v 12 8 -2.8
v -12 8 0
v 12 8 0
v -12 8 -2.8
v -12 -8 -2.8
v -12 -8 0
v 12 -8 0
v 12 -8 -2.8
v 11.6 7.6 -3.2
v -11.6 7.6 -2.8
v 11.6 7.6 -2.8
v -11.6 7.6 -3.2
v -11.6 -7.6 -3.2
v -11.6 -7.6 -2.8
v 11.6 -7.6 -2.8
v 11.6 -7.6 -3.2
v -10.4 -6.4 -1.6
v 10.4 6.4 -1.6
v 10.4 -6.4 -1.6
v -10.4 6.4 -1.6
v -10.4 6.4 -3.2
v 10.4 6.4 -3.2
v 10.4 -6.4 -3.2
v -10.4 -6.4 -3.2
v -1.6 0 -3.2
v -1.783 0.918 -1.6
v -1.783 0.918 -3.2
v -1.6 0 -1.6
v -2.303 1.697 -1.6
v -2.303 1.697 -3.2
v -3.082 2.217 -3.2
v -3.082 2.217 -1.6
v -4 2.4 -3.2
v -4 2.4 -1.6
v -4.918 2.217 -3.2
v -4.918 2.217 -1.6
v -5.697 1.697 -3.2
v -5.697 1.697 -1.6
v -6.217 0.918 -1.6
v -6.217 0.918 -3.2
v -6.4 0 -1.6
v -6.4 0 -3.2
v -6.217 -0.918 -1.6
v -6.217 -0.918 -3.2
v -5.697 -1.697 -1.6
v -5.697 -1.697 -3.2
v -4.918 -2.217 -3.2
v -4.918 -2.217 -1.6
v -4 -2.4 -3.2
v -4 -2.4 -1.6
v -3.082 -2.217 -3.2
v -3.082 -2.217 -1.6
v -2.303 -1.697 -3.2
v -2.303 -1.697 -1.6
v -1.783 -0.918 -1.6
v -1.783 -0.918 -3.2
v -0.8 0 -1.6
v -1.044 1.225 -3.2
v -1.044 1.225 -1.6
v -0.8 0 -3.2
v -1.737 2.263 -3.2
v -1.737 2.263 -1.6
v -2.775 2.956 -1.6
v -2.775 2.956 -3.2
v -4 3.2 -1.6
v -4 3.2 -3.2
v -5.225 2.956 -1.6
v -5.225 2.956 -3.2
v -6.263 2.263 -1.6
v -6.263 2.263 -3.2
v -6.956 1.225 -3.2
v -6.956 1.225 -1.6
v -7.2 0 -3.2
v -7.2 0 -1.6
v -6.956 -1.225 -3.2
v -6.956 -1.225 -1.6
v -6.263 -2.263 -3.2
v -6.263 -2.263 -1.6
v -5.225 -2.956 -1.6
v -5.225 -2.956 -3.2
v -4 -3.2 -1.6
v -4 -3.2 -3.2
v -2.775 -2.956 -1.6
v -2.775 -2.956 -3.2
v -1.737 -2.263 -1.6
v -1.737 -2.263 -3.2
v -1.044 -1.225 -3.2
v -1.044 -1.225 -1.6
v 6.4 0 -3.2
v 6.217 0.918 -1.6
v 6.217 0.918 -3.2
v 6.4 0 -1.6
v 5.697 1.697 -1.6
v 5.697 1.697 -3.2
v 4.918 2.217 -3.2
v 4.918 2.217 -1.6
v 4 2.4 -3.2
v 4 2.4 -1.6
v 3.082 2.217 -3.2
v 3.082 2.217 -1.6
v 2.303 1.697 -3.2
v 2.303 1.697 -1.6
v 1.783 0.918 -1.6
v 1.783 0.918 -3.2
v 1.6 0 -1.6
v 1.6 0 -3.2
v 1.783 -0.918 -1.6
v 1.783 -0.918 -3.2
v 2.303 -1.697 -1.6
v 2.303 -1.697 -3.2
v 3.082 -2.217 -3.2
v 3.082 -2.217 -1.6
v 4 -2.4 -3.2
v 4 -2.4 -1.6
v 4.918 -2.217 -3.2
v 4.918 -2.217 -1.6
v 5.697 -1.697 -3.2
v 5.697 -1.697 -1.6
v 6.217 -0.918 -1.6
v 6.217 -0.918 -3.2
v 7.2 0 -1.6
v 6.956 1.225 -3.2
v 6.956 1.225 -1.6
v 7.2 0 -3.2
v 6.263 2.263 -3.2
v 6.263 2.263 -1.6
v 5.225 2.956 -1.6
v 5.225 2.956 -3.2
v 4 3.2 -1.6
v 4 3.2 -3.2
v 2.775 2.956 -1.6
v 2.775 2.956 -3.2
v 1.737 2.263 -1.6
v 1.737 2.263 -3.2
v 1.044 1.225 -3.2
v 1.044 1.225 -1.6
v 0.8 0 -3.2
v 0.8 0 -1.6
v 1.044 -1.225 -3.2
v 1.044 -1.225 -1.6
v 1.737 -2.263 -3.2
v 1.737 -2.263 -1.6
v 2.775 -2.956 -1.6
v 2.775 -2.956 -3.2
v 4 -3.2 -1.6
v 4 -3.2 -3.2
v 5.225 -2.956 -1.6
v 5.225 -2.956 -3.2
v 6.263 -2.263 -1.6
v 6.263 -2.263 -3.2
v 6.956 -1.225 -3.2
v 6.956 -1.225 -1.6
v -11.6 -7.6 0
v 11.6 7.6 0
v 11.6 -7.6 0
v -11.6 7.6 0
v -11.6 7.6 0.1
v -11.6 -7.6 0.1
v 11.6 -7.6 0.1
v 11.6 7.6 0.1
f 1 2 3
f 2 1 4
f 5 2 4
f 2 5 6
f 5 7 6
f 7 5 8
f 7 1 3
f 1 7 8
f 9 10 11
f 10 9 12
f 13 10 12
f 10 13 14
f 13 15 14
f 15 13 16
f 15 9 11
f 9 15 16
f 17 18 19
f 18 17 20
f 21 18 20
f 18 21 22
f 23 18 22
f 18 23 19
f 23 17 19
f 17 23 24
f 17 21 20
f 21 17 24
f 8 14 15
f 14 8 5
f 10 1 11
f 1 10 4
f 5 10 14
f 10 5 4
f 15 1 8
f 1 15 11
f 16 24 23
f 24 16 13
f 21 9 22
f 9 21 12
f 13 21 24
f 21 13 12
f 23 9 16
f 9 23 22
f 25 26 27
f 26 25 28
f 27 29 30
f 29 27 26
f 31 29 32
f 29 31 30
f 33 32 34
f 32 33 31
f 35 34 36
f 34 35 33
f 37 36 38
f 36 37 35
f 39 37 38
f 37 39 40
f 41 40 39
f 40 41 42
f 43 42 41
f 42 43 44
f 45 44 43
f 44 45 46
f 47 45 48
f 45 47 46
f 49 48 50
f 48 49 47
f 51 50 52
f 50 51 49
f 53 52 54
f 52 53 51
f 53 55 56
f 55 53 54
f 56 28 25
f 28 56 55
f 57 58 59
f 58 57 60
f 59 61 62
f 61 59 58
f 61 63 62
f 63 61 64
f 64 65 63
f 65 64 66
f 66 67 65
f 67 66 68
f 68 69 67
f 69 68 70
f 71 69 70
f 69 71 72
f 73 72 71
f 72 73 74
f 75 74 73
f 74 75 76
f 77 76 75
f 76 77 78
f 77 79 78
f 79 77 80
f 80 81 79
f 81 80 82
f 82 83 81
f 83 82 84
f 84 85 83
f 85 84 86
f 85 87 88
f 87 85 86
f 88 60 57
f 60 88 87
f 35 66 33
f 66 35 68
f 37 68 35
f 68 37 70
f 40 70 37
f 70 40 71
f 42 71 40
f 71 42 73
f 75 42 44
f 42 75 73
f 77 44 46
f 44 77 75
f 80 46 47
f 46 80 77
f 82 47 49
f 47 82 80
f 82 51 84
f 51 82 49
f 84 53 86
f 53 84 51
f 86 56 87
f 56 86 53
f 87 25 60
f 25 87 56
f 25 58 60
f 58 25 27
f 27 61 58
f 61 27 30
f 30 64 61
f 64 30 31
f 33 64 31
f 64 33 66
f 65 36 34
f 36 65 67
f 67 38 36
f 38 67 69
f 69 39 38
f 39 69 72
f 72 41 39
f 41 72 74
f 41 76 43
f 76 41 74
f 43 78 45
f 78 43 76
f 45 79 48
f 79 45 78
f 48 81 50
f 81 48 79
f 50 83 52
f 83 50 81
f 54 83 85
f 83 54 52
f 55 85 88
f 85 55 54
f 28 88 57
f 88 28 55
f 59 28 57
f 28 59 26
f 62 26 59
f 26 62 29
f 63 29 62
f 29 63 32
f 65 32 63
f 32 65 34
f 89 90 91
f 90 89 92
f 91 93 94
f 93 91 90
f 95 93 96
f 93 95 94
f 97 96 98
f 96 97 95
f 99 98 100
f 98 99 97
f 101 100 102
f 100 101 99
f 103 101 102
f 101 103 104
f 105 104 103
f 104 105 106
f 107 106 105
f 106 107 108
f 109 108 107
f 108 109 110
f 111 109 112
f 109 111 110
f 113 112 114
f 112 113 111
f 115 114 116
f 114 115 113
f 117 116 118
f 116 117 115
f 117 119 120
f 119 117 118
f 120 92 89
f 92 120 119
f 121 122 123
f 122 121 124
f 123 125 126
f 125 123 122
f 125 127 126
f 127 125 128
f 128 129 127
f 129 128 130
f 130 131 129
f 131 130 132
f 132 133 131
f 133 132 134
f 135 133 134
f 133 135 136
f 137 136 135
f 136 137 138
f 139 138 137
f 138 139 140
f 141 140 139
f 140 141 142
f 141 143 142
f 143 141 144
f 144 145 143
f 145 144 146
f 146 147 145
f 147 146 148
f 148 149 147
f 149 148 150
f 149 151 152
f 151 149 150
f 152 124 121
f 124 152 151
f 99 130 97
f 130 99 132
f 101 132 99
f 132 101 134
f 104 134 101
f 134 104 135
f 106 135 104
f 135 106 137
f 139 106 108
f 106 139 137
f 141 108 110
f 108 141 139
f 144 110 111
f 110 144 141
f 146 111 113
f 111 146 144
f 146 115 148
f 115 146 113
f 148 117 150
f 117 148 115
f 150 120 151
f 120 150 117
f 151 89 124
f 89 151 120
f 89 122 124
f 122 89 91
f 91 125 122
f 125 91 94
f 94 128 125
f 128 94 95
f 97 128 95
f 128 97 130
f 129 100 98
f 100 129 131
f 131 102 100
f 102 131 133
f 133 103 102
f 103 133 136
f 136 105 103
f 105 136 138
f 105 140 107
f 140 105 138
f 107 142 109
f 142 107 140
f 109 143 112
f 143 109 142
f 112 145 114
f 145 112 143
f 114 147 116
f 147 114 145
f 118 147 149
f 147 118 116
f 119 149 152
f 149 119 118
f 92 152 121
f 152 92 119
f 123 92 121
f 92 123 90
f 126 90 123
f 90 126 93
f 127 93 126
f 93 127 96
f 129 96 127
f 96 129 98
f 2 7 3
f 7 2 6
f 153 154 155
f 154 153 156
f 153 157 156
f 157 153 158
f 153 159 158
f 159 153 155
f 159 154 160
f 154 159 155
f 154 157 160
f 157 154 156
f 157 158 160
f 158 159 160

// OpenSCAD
// file: ../p/4-4ring3.scad
use <../lib.scad>
$fa=1; $fs=0.2;
function ldraw_lib__4_4ring3(realsolid=false) = [
// 0 Ring  3 x 1.0
// 0 Name: 4-4ring3.dat
// 0 Author: James Jessiman
// 0 !LDRAW_ORG Primitive UPDATE 2009-01
// 0 !LICENSE Licensed under CC BY 2.0 and CC BY 4.0 : see CAreadme.txt
// 
// 0 BFC CERTIFY CCW
  [0,"BFC","CERTIFY"],
  [0,"BFC","CCW"],
// 
// 0 !HISTORY 1998-12-15 [PTadmin] Official Update 1998-10
// 0 !HISTORY 2002-04-05 [hafhead] Added BFC statement
// 0 !HISTORY 2002-04-25 [PTadmin] Official Update 2002-02
// 0 !HISTORY 2007-06-24 [PTadmin] Header formatted for Contributor Agreement
// 0 !HISTORY 2008-07-01 [PTadmin] Official Update 2008-01
// 0 !HISTORY 2008-08-26 [cwdee] Switch polygon winding and rename
// 0 !HISTORY 2009-05-02 [PTadmin] Official Update 2009-01
// 
// 
// 4 16 -1.5308 0 3.6956 -1.1481 0 2.7717 0 0 3 0 0 4
  [4,16,-1.5308,0,3.6956,-1.1481,0,2.7717,0,0,3,0,0,4],
// 4 16 -2.8284 0 2.8284 -2.1213 0 2.1213 -1.1481 0 2.7717 -1.5308 0 3.6956
  [4,16,-2.8284,0,2.8284,-2.1213,0,2.1213,-1.1481,0,2.7717,-1.5308,0,3.6956],
// 4 16 -3.6956 0 1.5308 -2.7717 0 1.1481 -2.1213 0 2.1213 -2.8284 0 2.8284
  [4,16,-3.6956,0,1.5308,-2.7717,0,1.1481,-2.1213,0,2.1213,-2.8284,0,2.8284],
// 4 16 -4 0 0 -3 0 0 -2.7717 0 1.1481 -3.6956 0 1.5308
  [4,16,-4,0,0,-3,0,0,-2.7717,0,1.1481,-3.6956,0,1.5308],
// 4 16 -3.6956 0 -1.5308 -2.7717 0 -1.1481 -3 0 0 -4 0 0
  [4,16,-3.6956,0,-1.5308,-2.7717,0,-1.1481,-3,0,0,-4,0,0],
// 4 16 -2.8284 0 -2.8284 -2.1213 0 -2.1213 -2.7717 0 -1.1481 -3.6956 0 -1.5308
  [4,16,-2.8284,0,-2.8284,-2.1213,0,-2.1213,-2.7717,0,-1.1481,-3.6956,0,-1.5308],
// 4 16 -1.5308 0 -3.6956 -1.1481 0 -2.7717 -2.1213 0 -2.1213 -2.8284 0 -2.8284
  [4,16,-1.5308,0,-3.6956,-1.1481,0,-2.7717,-2.1213,0,-2.1213,-2.8284,0,-2.8284],
// 4 16 0 0 -4 0 0 -3 -1.1481 0 -2.7717 -1.5308 0 -3.6956
  [4,16,0,0,-4,0,0,-3,-1.1481,0,-2.7717,-1.5308,0,-3.6956],
// 4 16 1.5308 0 -3.6956 1.1481 0 -2.7717 0 0 -3 0 0 -4
  [4,16,1.5308,0,-3.6956,1.1481,0,-2.7717,0,0,-3,0,0,-4],
// 4 16 2.8284 0 -2.8284 2.1213 0 -2.1213 1.1481 0 -2.7717 1.5308 0 -3.6956
  [4,16,2.8284,0,-2.8284,2.1213,0,-2.1213,1.1481,0,-2.7717,1.5308,0,-3.6956],
// 4 16 3.6956 0 -1.5308 2.7717 0 -1.1481 2.1213 0 -2.1213 2.8284 0 -2.8284
  [4,16,3.6956,0,-1.5308,2.7717,0,-1.1481,2.1213,0,-2.1213,2.8284,0,-2.8284],
// 4 16 4 0 0 3 0 0 2.7717 0 -1.1481 3.6956 0 -1.5308
  [4,16,4,0,0,3,0,0,2.7717,0,-1.1481,3.6956,0,-1.5308],
// 4 16 3.6956 0 1.5308 2.7717 0 1.1481 3 0 0 4 0 0
  [4,16,3.6956,0,1.5308,2.7717,0,1.1481,3,0,0,4,0,0],
// 4 16 2.8284 0 2.8284 2.1213 0 2.1213 2.7717 0 1.1481 3.6956 0 1.5308
  [4,16,2.8284,0,2.8284,2.1213,0,2.1213,2.7717,0,1.1481,3.6956,0,1.5308],
// 4 16 1.5308 0 3.6956 1.1481 0 2.7717 2.1213 0 2.1213 2.8284 0 2.8284
  [4,16,1.5308,0,3.6956,1.1481,0,2.7717,2.1213,0,2.1213,2.8284,0,2.8284],
// 4 16 0 0 4 0 0 3 1.1481 0 2.7717 1.5308 0 3.6956
  [4,16,0,0,4,0,0,3,1.1481,0,2.7717,1.5308,0,3.6956],
// 0
];
module ldraw_lib__4_4ring3(step=0, col=false, unit=2/5, alt=false, line=0.2, solid=!$preview)
    makepoly(ldraw_lib__4_4ring3(solid), step=step, col=col, unit=unit, alt=alt, line=line, solid=solid);
ldraw_lib__4_4ring3(line=0.2);
// file: ../p/4-4edge.scad
use <../lib.scad>
function ldraw_lib__4_4edge() = [
// 0 Circle 1.0
// 0 Name: 4-4edge.dat
// 0 Author: James Jessiman
// 0 !LDRAW_ORG Primitive UPDATE 2017-01
// 0 !LICENSE Licensed under CC BY 2.0 and CC BY 4.0 : see CAreadme.txt
// 
// 0 BFC CERTIFY CCW
  [0,"BFC","CERTIFY"],
  [0,"BFC","CCW"],
// 
// 0 !HISTORY 1998-12-15 [PTadmin] Official Update 1998-10
// 0 !HISTORY 2005-12-28 [PTadmin] Official Update 2005-01
// 0 !HISTORY 2007-06-24 [PTadmin] Header formatted for Contributor Agreement
// 0 !HISTORY 2008-07-01 [PTadmin] Official Update 2008-01
// 0 !HISTORY 2017-01-15 [Steffen] BFCed
// 0 !HISTORY 2017-12-30 [PTadmin] Official Update 2017-01
// 
// 
// 2 24 1 0 0 0.9239 0 0.3827
  [2,24,1,0,0,0.9239,0,0.3827],
// 2 24 0.9239 0 0.3827 0.7071 0 0.7071
  [2,24,0.9239,0,0.3827,0.7071,0,0.7071],
// 2 24 0.7071 0 0.7071 0.3827 0 0.9239
  [2,24,0.7071,0,0.7071,0.3827,0,0.9239],
// 2 24 0.3827 0 0.9239 0 0 1
  [2,24,0.3827,0,0.9239,0,0,1],
// 2 24 0 0 1 -0.3827 0 0.9239
  [2,24,0,0,1,-0.3827,0,0.9239],
// 2 24 -0.3827 0 0.9239 -0.7071 0 0.7071
  [2,24,-0.3827,0,0.9239,-0.7071,0,0.7071],
// 2 24 -0.7071 0 0.7071 -0.9239 0 0.3827
  [2,24,-0.7071,0,0.7071,-0.9239,0,0.3827],
// 2 24 -0.9239 0 0.3827 -1 0 -0
  [2,24,-0.9239,0,0.3827,-1,0,-0],
// 2 24 -1 0 -0 -0.9239 0 -0.3827
  [2,24,-1,0,-0,-0.9239,0,-0.3827],
// 2 24 -0.9239 0 -0.3827 -0.7071 0 -0.7071
  [2,24,-0.9239,0,-0.3827,-0.7071,0,-0.7071],
// 2 24 -0.7071 0 -0.7071 -0.3827 0 -0.9239
  [2,24,-0.7071,0,-0.7071,-0.3827,0,-0.9239],
// 2 24 -0.3827 0 -0.9239 0 0 -1
  [2,24,-0.3827,0,-0.9239,0,0,-1],
// 2 24 0 0 -1 0.3827 0 -0.9239
  [2,24,0,0,-1,0.3827,0,-0.9239],
// 2 24 0.3827 0 -0.9239 0.7071 0 -0.7071
  [2,24,0.3827,0,-0.9239,0.7071,0,-0.7071],
// 2 24 0.7071 0 -0.7071 0.9239 0 -0.3827
  [2,24,0.7071,0,-0.7071,0.9239,0,-0.3827],
// 2 24 0.9239 0 -0.3827 1 0 0
  [2,24,0.9239,0,-0.3827,1,0,0],
];
module ldraw_lib__4_4edge(step=0, col=false, unit=2/5, alt=false, line=0.2, solid=!$preview)
    makepoly(ldraw_lib__4_4edge(), step=step, col=col, unit=unit, alt=alt, line=line, solid=solid);
ldraw_lib__4_4edge(line=0.2);
// file: ../p/4-4cyli.scad
use <../lib.scad>
$fa=1; $fs=0.2;
function ldraw_lib__4_4cyli(realsolid=false) = [
// 0 Cylinder 1.0
// 0 Name: 4-4cyli.dat
// 0 Author: James Jessiman
// 0 !LDRAW_ORG Primitive UPDATE 2005-01
// 0 !LICENSE Licensed under CC BY 2.0 and CC BY 4.0 : see CAreadme.txt
// 
// 0 BFC CERTIFY CCW
  [0,"BFC","CERTIFY"],
  [0,"BFC","CCW"],
// 
// 0 !HISTORY 1998-12-15 [PTadmin] Official Update 1998-10
// 0 !HISTORY 2002-03-23 [sbliss] Added BFC statement; merged headers from files in distributions LDraw 0.27 and Complete.
// 0 !HISTORY 2002-04-25 [PTadmin] Official Update 2002-02
// 0 !HISTORY 2004-12-14 [guyvivan] BFC CCW
// 0 !HISTORY 2005-12-28 [PTadmin] Official Update 2005-01
// 0 !HISTORY 2007-06-24 [PTadmin] Header formatted for Contributor Agreement
// 0 !HISTORY 2008-07-01 [PTadmin] Official Update 2008-01
// 
// 
// 4 16 1 1 0 0.9239 1 0.3827 0.9239 0 0.3827 1 0 0
  [4,16,1,1,0,0.9239,1,0.3827,0.9239,0,0.3827,1,0,0],
// 5 24 1 0 0 1 1 0 0.9239 0 0.3827 0.9239 0 -0.3827
  [5,24,1,0,0,1,1,0,0.9239,0,0.3827,0.9239,0,-0.3827],
// 4 16 0.9239 1 0.3827 0.7071 1 0.7071 0.7071 0 0.7071 0.9239 0 0.3827
  [4,16,0.9239,1,0.3827,0.7071,1,0.7071,0.7071,0,0.7071,0.9239,0,0.3827],
// 5 24 0.9239 0 0.3827 0.9239 1 0.3827 0.7071 0 0.7071 1 0 0
  [5,24,0.9239,0,0.3827,0.9239,1,0.3827,0.7071,0,0.7071,1,0,0],
// 4 16 0.7071 1 0.7071 0.3827 1 0.9239 0.3827 0 0.9239 0.7071 0 0.7071
  [4,16,0.7071,1,0.7071,0.3827,1,0.9239,0.3827,0,0.9239,0.7071,0,0.7071],
// 5 24 0.7071 0 0.7071 0.7071 1 0.7071 0.3827 0 0.9239 0.9239 0 0.3827
  [5,24,0.7071,0,0.7071,0.7071,1,0.7071,0.3827,0,0.9239,0.9239,0,0.3827],
// 4 16 0.3827 1 0.9239 0 1 1 0 0 1 0.3827 0 0.9239
  [4,16,0.3827,1,0.9239,0,1,1,0,0,1,0.3827,0,0.9239],
// 5 24 0.3827 0 0.9239 0.3827 1 0.9239 0 0 1 0.7071 0 0.7071
  [5,24,0.3827,0,0.9239,0.3827,1,0.9239,0,0,1,0.7071,0,0.7071],
// 4 16 0 1 1 -0.3827 1 0.9239 -0.3827 0 0.9239 0 0 1
  [4,16,0,1,1,-0.3827,1,0.9239,-0.3827,0,0.9239,0,0,1],
// 5 24 0 0 1 0 1 1 -0.3827 0 0.9239 0.3827 0 0.9239
  [5,24,0,0,1,0,1,1,-0.3827,0,0.9239,0.3827,0,0.9239],
// 4 16 -0.3827 1 0.9239 -0.7071 1 0.7071 -0.7071 0 0.7071 -0.3827 0 0.9239
  [4,16,-0.3827,1,0.9239,-0.7071,1,0.7071,-0.7071,0,0.7071,-0.3827,0,0.9239],
// 5 24 -0.3827 0 0.9239 -0.3827 1 0.9239 -0.7071 0 0.7071 0 0 1
  [5,24,-0.3827,0,0.9239,-0.3827,1,0.9239,-0.7071,0,0.7071,0,0,1],
// 4 16 -0.7071 1 0.7071 -0.9239 1 0.3827 -0.9239 0 0.3827 -0.7071 0 0.7071
  [4,16,-0.7071,1,0.7071,-0.9239,1,0.3827,-0.9239,0,0.3827,-0.7071,0,0.7071],
// 5 24 -0.7071 0 0.7071 -0.7071 1 0.7071 -0.9239 0 0.3827 -0.3827 0 0.9239
  [5,24,-0.7071,0,0.7071,-0.7071,1,0.7071,-0.9239,0,0.3827,-0.3827,0,0.9239],
// 4 16 -0.9239 1 0.3827 -1 1 0 -1 0 0 -0.9239 0 0.3827
  [4,16,-0.9239,1,0.3827,-1,1,0,-1,0,0,-0.9239,0,0.3827],
// 5 24 -0.9239 0 0.3827 -0.9239 1 0.3827 -1 0 0 -0.7071 0 0.7071
  [5,24,-0.9239,0,0.3827,-0.9239,1,0.3827,-1,0,0,-0.7071,0,0.7071],
// 4 16 -1 1 0 -0.9239 1 -0.3827 -0.9239 0 -0.3827 -1 0 0
  [4,16,-1,1,0,-0.9239,1,-0.3827,-0.9239,0,-0.3827,-1,0,0],
// 5 24 -1 0 0 -1 1 0 -0.9239 0 -0.3827 -0.9239 0 0.3827
  [5,24,-1,0,0,-1,1,0,-0.9239,0,-0.3827,-0.9239,0,0.3827],
// 4 16 -0.9239 1 -0.3827 -0.7071 1 -0.7071 -0.7071 0 -0.7071 -0.9239 0 -0.3827
  [4,16,-0.9239,1,-0.3827,-0.7071,1,-0.7071,-0.7071,0,-0.7071,-0.9239,0,-0.3827],
// 5 24 -0.9239 0 -0.3827 -0.9239 1 -0.3827 -0.7071 0 -0.7071 -1 0 0
  [5,24,-0.9239,0,-0.3827,-0.9239,1,-0.3827,-0.7071,0,-0.7071,-1,0,0],
// 4 16 -0.7071 1 -0.7071 -0.3827 1 -0.9239 -0.3827 0 -0.9239 -0.7071 0 -0.7071
  [4,16,-0.7071,1,-0.7071,-0.3827,1,-0.9239,-0.3827,0,-0.9239,-0.7071,0,-0.7071],
// 5 24 -0.7071 0 -0.7071 -0.7071 1 -0.7071 -0.3827 0 -0.9239 -0.9239 0 -0.3827
  [5,24,-0.7071,0,-0.7071,-0.7071,1,-0.7071,-0.3827,0,-0.9239,-0.9239,0,-0.3827],
// 4 16 -0.3827 1 -0.9239 0 1 -1 0 0 -1 -0.3827 0 -0.9239
  [4,16,-0.3827,1,-0.9239,0,1,-1,0,0,-1,-0.3827,0,-0.9239],
// 5 24 -0.3827 0 -0.9239 -0.3827 1 -0.9239 0 0 -1 -0.7071 0 -0.7071
  [5,24,-0.3827,0,-0.9239,-0.3827,1,-0.9239,0,0,-1,-0.7071,0,-0.7071],
// 4 16 0 1 -1 0.3827 1 -0.9239 0.3827 0 -0.9239 0 0 -1
  [4,16,0,1,-1,0.3827,1,-0.9239,0.3827,0,-0.9239,0,0,-1],
// 5 24 0 0 -1 0 1 -1 0.3827 0 -0.9239 -0.3827 0 -0.9239
  [5,24,0,0,-1,0,1,-1,0.3827,0,-0.9239,-0.3827,0,-0.9239],
// 4 16 0.3827 1 -0.9239 0.7071 1 -0.7071 0.7071 0 -0.7071 0.3827 0 -0.9239
  [4,16,0.3827,1,-0.9239,0.7071,1,-0.7071,0.7071,0,-0.7071,0.3827,0,-0.9239],
// 5 24 0.3827 0 -0.9239 0.3827 1 -0.9239 0.7071 0 -0.7071 0 0 -1
  [5,24,0.3827,0,-0.9239,0.3827,1,-0.9239,0.7071,0,-0.7071,0,0,-1],
// 4 16 0.7071 1 -0.7071 0.9239 1 -0.3827 0.9239 0 -0.3827 0.7071 0 -0.7071
  [4,16,0.7071,1,-0.7071,0.9239,1,-0.3827,0.9239,0,-0.3827,0.7071,0,-0.7071],
// 5 24 0.7071 0 -0.7071 0.7071 1 -0.7071 0.9239 0 -0.3827 0.3827 0 -0.9239
  [5,24,0.7071,0,-0.7071,0.7071,1,-0.7071,0.9239,0,-0.3827,0.3827,0,-0.9239],
// 4 16 0.9239 1 -0.3827 1 1 0 1 0 0 0.9239 0 -0.3827
  [4,16,0.9239,1,-0.3827,1,1,0,1,0,0,0.9239,0,-0.3827],
// 5 24 0.9239 0 -0.3827 0.9239 1 -0.3827 1 0 0 0.7071 0 -0.7071
  [5,24,0.9239,0,-0.3827,0.9239,1,-0.3827,1,0,0,0.7071,0,-0.7071],
// 0
];
module ldraw_lib__4_4cyli(step=0, col=false, unit=2/5, alt=false, line=0.2, solid=!$preview)
    makepoly(ldraw_lib__4_4cyli(solid), step=step, col=col, unit=unit, alt=alt, line=line, solid=solid);
ldraw_lib__4_4cyli(line=0.2);
// file: ../p/stud4.scad
use <../lib.scad>
use <4-4cyli.scad>
use <4-4edge.scad>
use <4-4ring3.scad>
function ldraw_lib__stud4() = [
// 0 Stud Tube Open
// 0 Name: stud4.dat
// 0 Author: James Jessiman
// 0 !LDRAW_ORG Primitive UPDATE 2009-02
// 0 !LICENSE Licensed under CC BY 4.0 : see CAreadme.txt
// 
// 0 BFC CERTIFY CCW
  [0,"BFC","CERTIFY"],
  [0,"BFC","CCW"],
// 
// 0 !HISTORY 1999-07-05 [PTadmin] Official Update 1999-05
// 0 !HISTORY 2002-04-04 [sbliss] Modified for BFC compliance
// 0 !HISTORY 2002-04-25 [PTadmin] Official Update 2002-02
// 0 !HISTORY 2007-06-24 [PTadmin] Header formatted for Contributor Agreement
// 0 !HISTORY 2008-07-01 [PTadmin] Official Update 2008-01
// 0 !HISTORY 2009-06-21 [cwdee] Update ring references to 4-4ring
// 0 !HISTORY 2009-09-03 [PTadmin] Official Update 2009-02
// 
// 
// 1 16 0 -4 0 6 0 0 0 1 0 0 0 6 4-4edge.dat
  [1,16,0,-4,0,6,0,0,0,1,0,0,0,6, ldraw_lib__4_4edge()],
// 1 16 0 -4 0 8 0 0 0 1 0 0 0 8 4-4edge.dat
  [1,16,0,-4,0,8,0,0,0,1,0,0,0,8, ldraw_lib__4_4edge()],
// 1 16 0 0 0 6 0 0 0 1 0 0 0 6 4-4edge.dat
  [1,16,0,0,0,6,0,0,0,1,0,0,0,6, ldraw_lib__4_4edge()],
// 1 16 0 0 0 8 0 0 0 1 0 0 0 8 4-4edge.dat
  [1,16,0,0,0,8,0,0,0,1,0,0,0,8, ldraw_lib__4_4edge()],
// 0 BFC INVERTNEXT
  [0,"BFC","INVERTNEXT"],
// 1 16 0 -4 0 6 0 0 0 4 0 0 0 6 4-4cyli.dat
  [1,16,0,-4,0,6,0,0,0,4,0,0,0,6, ldraw_lib__4_4cyli()],
// 1 16 0 -4 0 8 0 0 0 4 0 0 0 8 4-4cyli.dat
  [1,16,0,-4,0,8,0,0,0,4,0,0,0,8, ldraw_lib__4_4cyli()],
// 1 16 0 -4 0 2 0 0 0 1 0 0 0 2 4-4ring3.dat
  [1,16,0,-4,0,2,0,0,0,1,0,0,0,2, ldraw_lib__4_4ring3()],
  [-1,16,0,0,0,2,0,0,0,-1,0,0,0,2, ldraw_lib__4_4ring3()],
// 0
];
module ldraw_lib__stud4(step=0, col=false, unit=2/5, alt=false, line=0.2, solid=!$preview)
    makepoly(ldraw_lib__stud4(), step=step, col=col, unit=unit, alt=alt, line=line, solid=solid);
ldraw_lib__stud4(line=0.2);
// file: ../p/stug4-1x2.scad
use <../lib.scad>
use <stud4.scad>
$fa=1; $fs=0.2;
function ldraw_lib__stug4_1x2(realsolid=false) = [
// 0 Stud Tube Open Group  1 x  2
// 0 Name: stug4-1x2.dat
// 0 Author: Steffen [Steffen]
// 0 !LDRAW_ORG Primitive UPDATE 2011-01
// 0 !LICENSE Licensed under CC BY 2.0 and CC BY 4.0 : see CAreadme.txt
// 
// 0 BFC CERTIFY CCW
  [0,"BFC","CERTIFY"],
  [0,"BFC","CCW"],
// 
// 0 !HISTORY 2011-07-25 [PTadmin] Official Update 2011-01
// 
// 
// 1 16 -10 0 0 1 0 0 0 1 0 0 0 1 stud4.dat
  [1,16,-10,0,0,1,0,0,0,1,0,0,0,1, ldraw_lib__stud4(realsolid)],
// 1 16 10 0 0 1 0 0 0 1 0 0 0 1 stud4.dat
  [1,16,10,0,0,1,0,0,0,1,0,0,0,1, ldraw_lib__stud4(realsolid)],
];
module ldraw_lib__stug4_1x2(step=0, col=false, unit=2/5, alt=false, line=0.2, solid=!$preview)
    makepoly(ldraw_lib__stug4_1x2(solid), step=step, col=col, unit=unit, alt=alt, line=line, solid=solid);
ldraw_lib__stug4_1x2(line=0.2);
// file: ../p/box5.scad
use <../lib.scad>
function ldraw_lib__box5() = [
// 0 Box with 5 Faces and All Edges
// 0 Name: box5.dat
// 0 Author: James Jessiman
// 0 !LDRAW_ORG Primitive UPDATE 2012-01
// 0 !LICENSE Licensed under CC BY 2.0 and CC BY 4.0 : see CAreadme.txt
// 
// 0 BFC CERTIFY CCW
  [0,"BFC","CERTIFY"],
  [0,"BFC","CCW"],
// 
// 0 !HISTORY 2002-04-03 [sbliss] Modified for BFC compliance
// 0 !HISTORY 2002-04-25 [PTadmin] Official Update 2002-02
// 0 !HISTORY 2007-06-24 [PTadmin] Header formatted for Contributor Agreement
// 0 !HISTORY 2008-07-01 [PTadmin] Official Update 2008-01
// 0 !HISTORY 2012-02-16 [Philo] Changed to CCW
// 0 !HISTORY 2012-03-30 [PTadmin] Official Update 2012-01
// 
// 
// 2 24 1 1 1 -1 1 1
  [2,24,1,1,1,-1,1,1],
// 2 24 -1 1 1 -1 1 -1
  [2,24,-1,1,1,-1,1,-1],
// 2 24 -1 1 -1 1 1 -1
  [2,24,-1,1,-1,1,1,-1],
// 2 24 1 1 -1 1 1 1
  [2,24,1,1,-1,1,1,1],
// 2 24 1 0 1 -1 0 1
  [2,24,1,0,1,-1,0,1],
// 2 24 -1 0 1 -1 0 -1
  [2,24,-1,0,1,-1,0,-1],
// 2 24 -1 0 -1 1 0 -1
  [2,24,-1,0,-1,1,0,-1],
// 2 24 1 0 -1 1 0 1
  [2,24,1,0,-1,1,0,1],
// 2 24 1 0 1 1 1 1
  [2,24,1,0,1,1,1,1],
// 2 24 -1 0 1 -1 1 1
  [2,24,-1,0,1,-1,1,1],
// 2 24 1 0 -1 1 1 -1
  [2,24,1,0,-1,1,1,-1],
// 2 24 -1 0 -1 -1 1 -1
  [2,24,-1,0,-1,-1,1,-1],
// 4 16 -1 1 1 1 1 1 1 1 -1 -1 1 -1
  [4,16,-1,1,1,1,1,1,1,1,-1,-1,1,-1],
// 4 16 -1 1 1 -1 0 1 1 0 1 1 1 1
  [4,16,-1,1,1,-1,0,1,1,0,1,1,1,1],
// 4 16 -1 1 -1 -1 0 -1 -1 0 1 -1 1 1
  [4,16,-1,1,-1,-1,0,-1,-1,0,1,-1,1,1],
// 4 16 1 1 -1 1 0 -1 -1 0 -1 -1 1 -1
  [4,16,1,1,-1,1,0,-1,-1,0,-1,-1,1,-1],
// 4 16 1 1 1 1 0 1 1 0 -1 1 1 -1
  [4,16,1,1,1,1,0,1,1,0,-1,1,1,-1],
];
makepoly(ldraw_lib__box5(), line=0.2);
// file: ../p/box4.scad
use <../lib.scad>
function ldraw_lib__box4() = [
// 0 Box with 4 Faces (2 Parallel Pairs) and All Edges
// 0 Name: box4.dat
// 0 Author: James Jessiman
// 0 !LDRAW_ORG Primitive UPDATE 2012-01
// 0 !LICENSE Licensed under CC BY 4.0 : see CAreadme.txt
// 
// 0 BFC CERTIFY CCW
  [0,"BFC","CERTIFY"],
  [0,"BFC","CCW"],
// 
// 0 !HISTORY 2002-04-03 [sbliss] Modified for BFC compliance
// 0 !HISTORY 2002-04-25 [PTadmin] Official Update 2002-02
// 0 !HISTORY 2007-06-24 [PTadmin] Header formatted for Contributor Agreement
// 0 !HISTORY 2008-07-01 [PTadmin] Official Update 2008-01
// 0 !HISTORY 2012-02-16 [Philo] Changed to CCW
// 0 !HISTORY 2012-03-30 [PTadmin] Official Update 2012-01
// 
// 
// 2 24 1 1 1 -1 1 1
  [2,24,1,1,1,-1,1,1],
// 2 24 -1 1 1 -1 1 -1
  [2,24,-1,1,1,-1,1,-1],
// 2 24 -1 1 -1 1 1 -1
  [2,24,-1,1,-1,1,1,-1],
// 2 24 1 1 -1 1 1 1
  [2,24,1,1,-1,1,1,1],
// 2 24 1 0 1 -1 0 1
  [2,24,1,0,1,-1,0,1],
// 2 24 -1 0 1 -1 0 -1
  [2,24,-1,0,1,-1,0,-1],
// 2 24 -1 0 -1 1 0 -1
  [2,24,-1,0,-1,1,0,-1],
// 2 24 1 0 -1 1 0 1
  [2,24,1,0,-1,1,0,1],
// 2 24 1 0 1 1 1 1
  [2,24,1,0,1,1,1,1],
// 2 24 -1 0 1 -1 1 1
  [2,24,-1,0,1,-1,1,1],
// 2 24 1 0 -1 1 1 -1
  [2,24,1,0,-1,1,1,-1],
// 2 24 -1 0 -1 -1 1 -1
  [2,24,-1,0,-1,-1,1,-1],
// 4 16 -1 1 1 -1 0 1 1 0 1 1 1 1
  [4,16,-1,1,1,-1,0,1,1,0,1,1,1,1],
// 4 16 -1 1 -1 -1 0 -1 -1 0 1 -1 1 1
  [4,16,-1,1,-1,-1,0,-1,-1,0,1,-1,1,1],
// 4 16 1 1 -1 1 0 -1 -1 0 -1 -1 1 -1
  [4,16,1,1,-1,1,0,-1,-1,0,-1,-1,1,-1],
// 4 16 1 1 1 1 0 1 1 0 -1 1 1 -1
  [4,16,1,1,1,1,0,1,1,0,-1,1,1,-1],
];
module ldraw_lib__box4(step=0, col=false, unit=2/5, alt=false, line=0.2, solid=!$preview)
    makepoly(ldraw_lib__box4(), step=step, col=col, unit=unit, alt=alt, line=line, solid=solid);
ldraw_lib__box4(line=0.2);
// file: ../p/box5-12.scad
use <../lib.scad>
function ldraw_lib__box5_12() = [
// 0 Box with 5 Faces without Any Edges
// 0 Name: box5-12.dat
// 0 Author: Chris Dee [cwdee]
// 0 !LDRAW_ORG Primitive UPDATE 2009-02
// 0 !LICENSE Licensed under CC BY 2.0 and CC BY 4.0 : see CAreadme.txt
// 
// 0 BFC CERTIFY CCW
  [0,"BFC","CERTIFY"],
  [0,"BFC","CCW"],
// 
// 0 !HISTORY 2009-09-03 [PTadmin] Official Update 2009-02
// 
// 
// 4 16 1 1 1 1 1 -1 -1 1 -1 -1 1 1
  [4,16,1,1,1,1,1,-1,-1,1,-1,-1,1,1],
// 4 16 -1 0 1 1 0 1 1 1 1 -1 1 1
  [4,16,-1,0,1,1,0,1,1,1,1,-1,1,1],
// 4 16 -1 0 -1 -1 0 1 -1 1 1 -1 1 -1
  [4,16,-1,0,-1,-1,0,1,-1,1,1,-1,1,-1],
// 4 16 1 0 -1 -1 0 -1 -1 1 -1 1 1 -1
  [4,16,1,0,-1,-1,0,-1,-1,1,-1,1,1,-1],
// 4 16 1 0 1 1 0 -1 1 1 -1 1 1 1
  [4,16,1,0,1,1,0,-1,1,1,-1,1,1,1],
// 0
];
module ldraw_lib__box5_12(step=0, col=false, unit=2/5, alt=false, line=0.2, solid=!$preview)
    makepoly(ldraw_lib__box5_12(), step=step, col=col, unit=unit, alt=alt, line=line, solid=solid);
ldraw_lib__box5_12(line=0.2);
// file: s/26603s01.scad
use <../../lib.scad>
use <../../p/box4.scad>
use <../../p/box5.scad>
use <../../p/stug4-1x2.scad>
$fa=1; $fs=0.2;
function ldraw_lib__s__26603s01(realsolid=false) = [
// 0 ~Tile  2 x  3 without Top
// 0 Name: s\26603s01.dat
// 0 Author: Philippe Hurbain [Philo]
// 0 !LDRAW_ORG Subpart UPDATE 2016-01
// 0 !LICENSE Licensed under CC BY 2.0 and CC BY 4.0 : see CAreadme.txt
// 
// 0 BFC CERTIFY CCW
  [0,"BFC","CERTIFY"],
  [0,"BFC","CCW"],
// 
// 0 !HISTORY 2016-12-31 [PTadmin] Official Update 2016-01
// 
// 
// 1 16 0 0 0 30 0 0 0 7 0 0 0 20 box4.dat
  [1,16,0,0,0,30,0,0,0,7,0,0,0,20, ldraw_lib__box4(realsolid)],
// 1 16 0 7 0 29 0 0 0 1 0 0 0 19 box4.dat
  [1,16,0,7,0,29,0,0,0,1,0,0,0,19, ldraw_lib__box4(realsolid)],
// 0 BFC INVERTNEXT
  [0,"BFC","INVERTNEXT"],
// 1 16 0 8 0 -26 0 0 0 -4 0 0 0 16 box5.dat
  [1,16,0,8,0,-26,0,0,0,-4,0,0,0,16, ldraw_lib__box5(realsolid)],
// 4 16 -30 7 -20 -29 7 -19 29 7 -19 30 7 -20
  [4,16,-30,7,-20,-29,7,-19,29,7,-19,30,7,-20],
// 4 16 30 7 20 29 7 19 -29 7 19 -30 7 20
  [4,16,30,7,20,29,7,19,-29,7,19,-30,7,20],
// 4 16 -30 7 -20 -30 7 20 -29 7 19 -29 7 -19
  [4,16,-30,7,-20,-30,7,20,-29,7,19,-29,7,-19],
// 4 16 30 7 20 30 7 -20 29 7 -19 29 7 19
  [4,16,30,7,20,30,7,-20,29,7,-19,29,7,19],
// 4 16 -29 8 -19 -26 8 -16 26 8 -16 29 8 -19
  [4,16,-29,8,-19,-26,8,-16,26,8,-16,29,8,-19],
// 4 16 29 8 19 26 8 16 -26 8 16 -29 8 19
  [4,16,29,8,19,26,8,16,-26,8,16,-29,8,19],
// 4 16 -29 8 -19 -29 8 19 -26 8 16 -26 8 -16
  [4,16,-29,8,-19,-29,8,19,-26,8,16,-26,8,-16],
// 4 16 29 8 19 29 8 -19 26 8 -16 26 8 16
  [4,16,29,8,19,29,8,-19,26,8,-16,26,8,16],
// 1 16 0 4 0 1 0 0 0 -1 0 0 0 1 stug4-1x2.dat
  [1,16,0,4,0,1,0,0,0,-1,0,0,0,1, ldraw_lib__stug4_1x2(realsolid)],
];
module ldraw_lib__s__26603s01(step=0, col=false, unit=2/5, alt=false, line=0.2, solid=!$preview)
    makepoly(ldraw_lib__s__26603s01(solid), step=step, col=col, unit=unit, alt=alt, line=line, solid=solid);
ldraw_lib__s__26603s01(line=0.2);
// file: 6279911i.scad
use <../lib.scad>
use <../p/box5-12.scad>
function ldraw_lib__6279911i() = [
// 0 Sticker  2.9 x  1.9 with Black and Chrome Gold Triangles
// 0 Name: 6279911i.dat
// 0 Author: Jaco van der Molen [Jaco]
// 0 !LDRAW_ORG Part UPDATE 2019-03
// 0 !LICENSE Licensed under CC BY 2.0 and CC BY 4.0 : see CAreadme.txt
// 
// 0 BFC CERTIFY CCW
  [0,"BFC","CERTIFY"],
  [0,"BFC","CCW"],
// 
// 0 !KEYWORDS Apollo 11, Lunar Lander, NASA, set 10266
// 
// 0 !HISTORY 2019-12-27 [PTadmin] Official Update 2019-03
// 
// 
// 1 16 0 -0.25 0 19 0 0 0 0.25 0 0 0 29 box5-12.dat
  [1,16,0,-0.25,0,19,0,0,0,0.25,0,0,0,29, ldraw_lib__box5_12()],
// 3 0 19 -0.25 29 -19 -0.25 29 19 -0.25 -29
  [3,0,19,-0.25,29,-19,-0.25,29,19,-0.25,-29],
// 3 334 -19 -0.25 29 -19 -0.25 -29 19 -0.25 -29
  [3,334,-19,-0.25,29,-19,-0.25,-29,19,-0.25,-29],
];
module ldraw_lib__6279911i(step=0, col=false, unit=2/5, alt=false, line=0.2, solid=!$preview)
    makepoly(ldraw_lib__6279911i(), step=step, col=col, unit=unit, alt=alt, line=line, solid=solid);
ldraw_lib__6279911i(line=0.2);
// file: 26603.scad
use <../lib.scad>
use <s/26603s01.scad>
$fa=1; $fs=0.2;
function ldraw_lib__26603(realsolid=false) = [
// 0 Tile  2 x  3
// 0 Name: 26603.dat
// 0 Author: Philippe Hurbain [Philo]
// 0 !LDRAW_ORG Part UPDATE 2016-01
// 0 !LICENSE Licensed under CC BY 2.0 and CC BY 4.0 : see CAreadme.txt
// 
// 0 BFC CERTIFY CCW
  [0,"BFC","CERTIFY"],
  [0,"BFC","CCW"],
// 
// 0 !HISTORY 2016-12-31 [PTadmin] Official Update 2016-01
// 
// 
// 1 16 0 0 0 1 0 0 0 1 0 0 0 1 s\26603s01.dat
  [1,16,0,0,0,1,0,0,0,1,0,0,0,1, ldraw_lib__s__26603s01(realsolid)],
// 4 16 30 0 20 -30 0 20 -30 0 -20 30 0 -20
  [4,16,30,0,20,-30,0,20,-30,0,-20,30,0,-20],
];
module ldraw_lib__26603(step=0, col=false, unit=2/5, alt=false, line=0.2, solid=!$preview)
    makepoly(ldraw_lib__26603(solid), step=step, col=col, unit=unit, alt=alt, line=line, solid=solid);
ldraw_lib__26603(line=0.2);
// main file
use <../lib.scad>
use <26603.scad>
use <6279911i.scad>
function ldraw_lib__26603d03() = [
// 0 Tile 2 x 3 with Black and Chrome Gold Triangles Sticker
// 0 Name: 26603d03.dat
// 0 Author: Evert-Jan Boer [ejboer]
// 0 !LDRAW_ORG Shortcut UPDATE 2024-08
// 0 !LICENSE Licensed under CC BY 4.0 : see CAreadme.txt
// 
// 0 BFC CERTIFY CCW
  [0,"BFC","CERTIFY"],
  [0,"BFC","CCW"],
// 
// 0 !CATEGORY Sticker Shortcut
// 0 !KEYWORDS Bricklink 26603pb053, NASA Apollo 11 Lunar Lander, set 10266
// 
// 0 !HISTORY 2024-09-30 [OrionP] Official Update 2024-08
// 
// 1 16 0 0 0 1 0 0 0 1 0 0 0 1 26603.dat
  [1,16,0,0,0,1,0,0,0,1,0,0,0,1, ldraw_lib__26603()],
// 1 16 0 0 0 0 0 -1 0 1 0 1 0 0 6279911i.dat
  [1,16,0,0,0,0,0,-1,0,1,0,1,0,0, ldraw_lib__6279911i()],
];
module ldraw_lib__26603d03(step=0, col=false, unit=2/5, alt=false, line=0.2, solid=!$preview)
    makepoly(ldraw_lib__26603d03(), step=step, col=col, unit=unit, alt=alt, line=line, solid=solid);
ldraw_lib__26603d03(line=0.2);
